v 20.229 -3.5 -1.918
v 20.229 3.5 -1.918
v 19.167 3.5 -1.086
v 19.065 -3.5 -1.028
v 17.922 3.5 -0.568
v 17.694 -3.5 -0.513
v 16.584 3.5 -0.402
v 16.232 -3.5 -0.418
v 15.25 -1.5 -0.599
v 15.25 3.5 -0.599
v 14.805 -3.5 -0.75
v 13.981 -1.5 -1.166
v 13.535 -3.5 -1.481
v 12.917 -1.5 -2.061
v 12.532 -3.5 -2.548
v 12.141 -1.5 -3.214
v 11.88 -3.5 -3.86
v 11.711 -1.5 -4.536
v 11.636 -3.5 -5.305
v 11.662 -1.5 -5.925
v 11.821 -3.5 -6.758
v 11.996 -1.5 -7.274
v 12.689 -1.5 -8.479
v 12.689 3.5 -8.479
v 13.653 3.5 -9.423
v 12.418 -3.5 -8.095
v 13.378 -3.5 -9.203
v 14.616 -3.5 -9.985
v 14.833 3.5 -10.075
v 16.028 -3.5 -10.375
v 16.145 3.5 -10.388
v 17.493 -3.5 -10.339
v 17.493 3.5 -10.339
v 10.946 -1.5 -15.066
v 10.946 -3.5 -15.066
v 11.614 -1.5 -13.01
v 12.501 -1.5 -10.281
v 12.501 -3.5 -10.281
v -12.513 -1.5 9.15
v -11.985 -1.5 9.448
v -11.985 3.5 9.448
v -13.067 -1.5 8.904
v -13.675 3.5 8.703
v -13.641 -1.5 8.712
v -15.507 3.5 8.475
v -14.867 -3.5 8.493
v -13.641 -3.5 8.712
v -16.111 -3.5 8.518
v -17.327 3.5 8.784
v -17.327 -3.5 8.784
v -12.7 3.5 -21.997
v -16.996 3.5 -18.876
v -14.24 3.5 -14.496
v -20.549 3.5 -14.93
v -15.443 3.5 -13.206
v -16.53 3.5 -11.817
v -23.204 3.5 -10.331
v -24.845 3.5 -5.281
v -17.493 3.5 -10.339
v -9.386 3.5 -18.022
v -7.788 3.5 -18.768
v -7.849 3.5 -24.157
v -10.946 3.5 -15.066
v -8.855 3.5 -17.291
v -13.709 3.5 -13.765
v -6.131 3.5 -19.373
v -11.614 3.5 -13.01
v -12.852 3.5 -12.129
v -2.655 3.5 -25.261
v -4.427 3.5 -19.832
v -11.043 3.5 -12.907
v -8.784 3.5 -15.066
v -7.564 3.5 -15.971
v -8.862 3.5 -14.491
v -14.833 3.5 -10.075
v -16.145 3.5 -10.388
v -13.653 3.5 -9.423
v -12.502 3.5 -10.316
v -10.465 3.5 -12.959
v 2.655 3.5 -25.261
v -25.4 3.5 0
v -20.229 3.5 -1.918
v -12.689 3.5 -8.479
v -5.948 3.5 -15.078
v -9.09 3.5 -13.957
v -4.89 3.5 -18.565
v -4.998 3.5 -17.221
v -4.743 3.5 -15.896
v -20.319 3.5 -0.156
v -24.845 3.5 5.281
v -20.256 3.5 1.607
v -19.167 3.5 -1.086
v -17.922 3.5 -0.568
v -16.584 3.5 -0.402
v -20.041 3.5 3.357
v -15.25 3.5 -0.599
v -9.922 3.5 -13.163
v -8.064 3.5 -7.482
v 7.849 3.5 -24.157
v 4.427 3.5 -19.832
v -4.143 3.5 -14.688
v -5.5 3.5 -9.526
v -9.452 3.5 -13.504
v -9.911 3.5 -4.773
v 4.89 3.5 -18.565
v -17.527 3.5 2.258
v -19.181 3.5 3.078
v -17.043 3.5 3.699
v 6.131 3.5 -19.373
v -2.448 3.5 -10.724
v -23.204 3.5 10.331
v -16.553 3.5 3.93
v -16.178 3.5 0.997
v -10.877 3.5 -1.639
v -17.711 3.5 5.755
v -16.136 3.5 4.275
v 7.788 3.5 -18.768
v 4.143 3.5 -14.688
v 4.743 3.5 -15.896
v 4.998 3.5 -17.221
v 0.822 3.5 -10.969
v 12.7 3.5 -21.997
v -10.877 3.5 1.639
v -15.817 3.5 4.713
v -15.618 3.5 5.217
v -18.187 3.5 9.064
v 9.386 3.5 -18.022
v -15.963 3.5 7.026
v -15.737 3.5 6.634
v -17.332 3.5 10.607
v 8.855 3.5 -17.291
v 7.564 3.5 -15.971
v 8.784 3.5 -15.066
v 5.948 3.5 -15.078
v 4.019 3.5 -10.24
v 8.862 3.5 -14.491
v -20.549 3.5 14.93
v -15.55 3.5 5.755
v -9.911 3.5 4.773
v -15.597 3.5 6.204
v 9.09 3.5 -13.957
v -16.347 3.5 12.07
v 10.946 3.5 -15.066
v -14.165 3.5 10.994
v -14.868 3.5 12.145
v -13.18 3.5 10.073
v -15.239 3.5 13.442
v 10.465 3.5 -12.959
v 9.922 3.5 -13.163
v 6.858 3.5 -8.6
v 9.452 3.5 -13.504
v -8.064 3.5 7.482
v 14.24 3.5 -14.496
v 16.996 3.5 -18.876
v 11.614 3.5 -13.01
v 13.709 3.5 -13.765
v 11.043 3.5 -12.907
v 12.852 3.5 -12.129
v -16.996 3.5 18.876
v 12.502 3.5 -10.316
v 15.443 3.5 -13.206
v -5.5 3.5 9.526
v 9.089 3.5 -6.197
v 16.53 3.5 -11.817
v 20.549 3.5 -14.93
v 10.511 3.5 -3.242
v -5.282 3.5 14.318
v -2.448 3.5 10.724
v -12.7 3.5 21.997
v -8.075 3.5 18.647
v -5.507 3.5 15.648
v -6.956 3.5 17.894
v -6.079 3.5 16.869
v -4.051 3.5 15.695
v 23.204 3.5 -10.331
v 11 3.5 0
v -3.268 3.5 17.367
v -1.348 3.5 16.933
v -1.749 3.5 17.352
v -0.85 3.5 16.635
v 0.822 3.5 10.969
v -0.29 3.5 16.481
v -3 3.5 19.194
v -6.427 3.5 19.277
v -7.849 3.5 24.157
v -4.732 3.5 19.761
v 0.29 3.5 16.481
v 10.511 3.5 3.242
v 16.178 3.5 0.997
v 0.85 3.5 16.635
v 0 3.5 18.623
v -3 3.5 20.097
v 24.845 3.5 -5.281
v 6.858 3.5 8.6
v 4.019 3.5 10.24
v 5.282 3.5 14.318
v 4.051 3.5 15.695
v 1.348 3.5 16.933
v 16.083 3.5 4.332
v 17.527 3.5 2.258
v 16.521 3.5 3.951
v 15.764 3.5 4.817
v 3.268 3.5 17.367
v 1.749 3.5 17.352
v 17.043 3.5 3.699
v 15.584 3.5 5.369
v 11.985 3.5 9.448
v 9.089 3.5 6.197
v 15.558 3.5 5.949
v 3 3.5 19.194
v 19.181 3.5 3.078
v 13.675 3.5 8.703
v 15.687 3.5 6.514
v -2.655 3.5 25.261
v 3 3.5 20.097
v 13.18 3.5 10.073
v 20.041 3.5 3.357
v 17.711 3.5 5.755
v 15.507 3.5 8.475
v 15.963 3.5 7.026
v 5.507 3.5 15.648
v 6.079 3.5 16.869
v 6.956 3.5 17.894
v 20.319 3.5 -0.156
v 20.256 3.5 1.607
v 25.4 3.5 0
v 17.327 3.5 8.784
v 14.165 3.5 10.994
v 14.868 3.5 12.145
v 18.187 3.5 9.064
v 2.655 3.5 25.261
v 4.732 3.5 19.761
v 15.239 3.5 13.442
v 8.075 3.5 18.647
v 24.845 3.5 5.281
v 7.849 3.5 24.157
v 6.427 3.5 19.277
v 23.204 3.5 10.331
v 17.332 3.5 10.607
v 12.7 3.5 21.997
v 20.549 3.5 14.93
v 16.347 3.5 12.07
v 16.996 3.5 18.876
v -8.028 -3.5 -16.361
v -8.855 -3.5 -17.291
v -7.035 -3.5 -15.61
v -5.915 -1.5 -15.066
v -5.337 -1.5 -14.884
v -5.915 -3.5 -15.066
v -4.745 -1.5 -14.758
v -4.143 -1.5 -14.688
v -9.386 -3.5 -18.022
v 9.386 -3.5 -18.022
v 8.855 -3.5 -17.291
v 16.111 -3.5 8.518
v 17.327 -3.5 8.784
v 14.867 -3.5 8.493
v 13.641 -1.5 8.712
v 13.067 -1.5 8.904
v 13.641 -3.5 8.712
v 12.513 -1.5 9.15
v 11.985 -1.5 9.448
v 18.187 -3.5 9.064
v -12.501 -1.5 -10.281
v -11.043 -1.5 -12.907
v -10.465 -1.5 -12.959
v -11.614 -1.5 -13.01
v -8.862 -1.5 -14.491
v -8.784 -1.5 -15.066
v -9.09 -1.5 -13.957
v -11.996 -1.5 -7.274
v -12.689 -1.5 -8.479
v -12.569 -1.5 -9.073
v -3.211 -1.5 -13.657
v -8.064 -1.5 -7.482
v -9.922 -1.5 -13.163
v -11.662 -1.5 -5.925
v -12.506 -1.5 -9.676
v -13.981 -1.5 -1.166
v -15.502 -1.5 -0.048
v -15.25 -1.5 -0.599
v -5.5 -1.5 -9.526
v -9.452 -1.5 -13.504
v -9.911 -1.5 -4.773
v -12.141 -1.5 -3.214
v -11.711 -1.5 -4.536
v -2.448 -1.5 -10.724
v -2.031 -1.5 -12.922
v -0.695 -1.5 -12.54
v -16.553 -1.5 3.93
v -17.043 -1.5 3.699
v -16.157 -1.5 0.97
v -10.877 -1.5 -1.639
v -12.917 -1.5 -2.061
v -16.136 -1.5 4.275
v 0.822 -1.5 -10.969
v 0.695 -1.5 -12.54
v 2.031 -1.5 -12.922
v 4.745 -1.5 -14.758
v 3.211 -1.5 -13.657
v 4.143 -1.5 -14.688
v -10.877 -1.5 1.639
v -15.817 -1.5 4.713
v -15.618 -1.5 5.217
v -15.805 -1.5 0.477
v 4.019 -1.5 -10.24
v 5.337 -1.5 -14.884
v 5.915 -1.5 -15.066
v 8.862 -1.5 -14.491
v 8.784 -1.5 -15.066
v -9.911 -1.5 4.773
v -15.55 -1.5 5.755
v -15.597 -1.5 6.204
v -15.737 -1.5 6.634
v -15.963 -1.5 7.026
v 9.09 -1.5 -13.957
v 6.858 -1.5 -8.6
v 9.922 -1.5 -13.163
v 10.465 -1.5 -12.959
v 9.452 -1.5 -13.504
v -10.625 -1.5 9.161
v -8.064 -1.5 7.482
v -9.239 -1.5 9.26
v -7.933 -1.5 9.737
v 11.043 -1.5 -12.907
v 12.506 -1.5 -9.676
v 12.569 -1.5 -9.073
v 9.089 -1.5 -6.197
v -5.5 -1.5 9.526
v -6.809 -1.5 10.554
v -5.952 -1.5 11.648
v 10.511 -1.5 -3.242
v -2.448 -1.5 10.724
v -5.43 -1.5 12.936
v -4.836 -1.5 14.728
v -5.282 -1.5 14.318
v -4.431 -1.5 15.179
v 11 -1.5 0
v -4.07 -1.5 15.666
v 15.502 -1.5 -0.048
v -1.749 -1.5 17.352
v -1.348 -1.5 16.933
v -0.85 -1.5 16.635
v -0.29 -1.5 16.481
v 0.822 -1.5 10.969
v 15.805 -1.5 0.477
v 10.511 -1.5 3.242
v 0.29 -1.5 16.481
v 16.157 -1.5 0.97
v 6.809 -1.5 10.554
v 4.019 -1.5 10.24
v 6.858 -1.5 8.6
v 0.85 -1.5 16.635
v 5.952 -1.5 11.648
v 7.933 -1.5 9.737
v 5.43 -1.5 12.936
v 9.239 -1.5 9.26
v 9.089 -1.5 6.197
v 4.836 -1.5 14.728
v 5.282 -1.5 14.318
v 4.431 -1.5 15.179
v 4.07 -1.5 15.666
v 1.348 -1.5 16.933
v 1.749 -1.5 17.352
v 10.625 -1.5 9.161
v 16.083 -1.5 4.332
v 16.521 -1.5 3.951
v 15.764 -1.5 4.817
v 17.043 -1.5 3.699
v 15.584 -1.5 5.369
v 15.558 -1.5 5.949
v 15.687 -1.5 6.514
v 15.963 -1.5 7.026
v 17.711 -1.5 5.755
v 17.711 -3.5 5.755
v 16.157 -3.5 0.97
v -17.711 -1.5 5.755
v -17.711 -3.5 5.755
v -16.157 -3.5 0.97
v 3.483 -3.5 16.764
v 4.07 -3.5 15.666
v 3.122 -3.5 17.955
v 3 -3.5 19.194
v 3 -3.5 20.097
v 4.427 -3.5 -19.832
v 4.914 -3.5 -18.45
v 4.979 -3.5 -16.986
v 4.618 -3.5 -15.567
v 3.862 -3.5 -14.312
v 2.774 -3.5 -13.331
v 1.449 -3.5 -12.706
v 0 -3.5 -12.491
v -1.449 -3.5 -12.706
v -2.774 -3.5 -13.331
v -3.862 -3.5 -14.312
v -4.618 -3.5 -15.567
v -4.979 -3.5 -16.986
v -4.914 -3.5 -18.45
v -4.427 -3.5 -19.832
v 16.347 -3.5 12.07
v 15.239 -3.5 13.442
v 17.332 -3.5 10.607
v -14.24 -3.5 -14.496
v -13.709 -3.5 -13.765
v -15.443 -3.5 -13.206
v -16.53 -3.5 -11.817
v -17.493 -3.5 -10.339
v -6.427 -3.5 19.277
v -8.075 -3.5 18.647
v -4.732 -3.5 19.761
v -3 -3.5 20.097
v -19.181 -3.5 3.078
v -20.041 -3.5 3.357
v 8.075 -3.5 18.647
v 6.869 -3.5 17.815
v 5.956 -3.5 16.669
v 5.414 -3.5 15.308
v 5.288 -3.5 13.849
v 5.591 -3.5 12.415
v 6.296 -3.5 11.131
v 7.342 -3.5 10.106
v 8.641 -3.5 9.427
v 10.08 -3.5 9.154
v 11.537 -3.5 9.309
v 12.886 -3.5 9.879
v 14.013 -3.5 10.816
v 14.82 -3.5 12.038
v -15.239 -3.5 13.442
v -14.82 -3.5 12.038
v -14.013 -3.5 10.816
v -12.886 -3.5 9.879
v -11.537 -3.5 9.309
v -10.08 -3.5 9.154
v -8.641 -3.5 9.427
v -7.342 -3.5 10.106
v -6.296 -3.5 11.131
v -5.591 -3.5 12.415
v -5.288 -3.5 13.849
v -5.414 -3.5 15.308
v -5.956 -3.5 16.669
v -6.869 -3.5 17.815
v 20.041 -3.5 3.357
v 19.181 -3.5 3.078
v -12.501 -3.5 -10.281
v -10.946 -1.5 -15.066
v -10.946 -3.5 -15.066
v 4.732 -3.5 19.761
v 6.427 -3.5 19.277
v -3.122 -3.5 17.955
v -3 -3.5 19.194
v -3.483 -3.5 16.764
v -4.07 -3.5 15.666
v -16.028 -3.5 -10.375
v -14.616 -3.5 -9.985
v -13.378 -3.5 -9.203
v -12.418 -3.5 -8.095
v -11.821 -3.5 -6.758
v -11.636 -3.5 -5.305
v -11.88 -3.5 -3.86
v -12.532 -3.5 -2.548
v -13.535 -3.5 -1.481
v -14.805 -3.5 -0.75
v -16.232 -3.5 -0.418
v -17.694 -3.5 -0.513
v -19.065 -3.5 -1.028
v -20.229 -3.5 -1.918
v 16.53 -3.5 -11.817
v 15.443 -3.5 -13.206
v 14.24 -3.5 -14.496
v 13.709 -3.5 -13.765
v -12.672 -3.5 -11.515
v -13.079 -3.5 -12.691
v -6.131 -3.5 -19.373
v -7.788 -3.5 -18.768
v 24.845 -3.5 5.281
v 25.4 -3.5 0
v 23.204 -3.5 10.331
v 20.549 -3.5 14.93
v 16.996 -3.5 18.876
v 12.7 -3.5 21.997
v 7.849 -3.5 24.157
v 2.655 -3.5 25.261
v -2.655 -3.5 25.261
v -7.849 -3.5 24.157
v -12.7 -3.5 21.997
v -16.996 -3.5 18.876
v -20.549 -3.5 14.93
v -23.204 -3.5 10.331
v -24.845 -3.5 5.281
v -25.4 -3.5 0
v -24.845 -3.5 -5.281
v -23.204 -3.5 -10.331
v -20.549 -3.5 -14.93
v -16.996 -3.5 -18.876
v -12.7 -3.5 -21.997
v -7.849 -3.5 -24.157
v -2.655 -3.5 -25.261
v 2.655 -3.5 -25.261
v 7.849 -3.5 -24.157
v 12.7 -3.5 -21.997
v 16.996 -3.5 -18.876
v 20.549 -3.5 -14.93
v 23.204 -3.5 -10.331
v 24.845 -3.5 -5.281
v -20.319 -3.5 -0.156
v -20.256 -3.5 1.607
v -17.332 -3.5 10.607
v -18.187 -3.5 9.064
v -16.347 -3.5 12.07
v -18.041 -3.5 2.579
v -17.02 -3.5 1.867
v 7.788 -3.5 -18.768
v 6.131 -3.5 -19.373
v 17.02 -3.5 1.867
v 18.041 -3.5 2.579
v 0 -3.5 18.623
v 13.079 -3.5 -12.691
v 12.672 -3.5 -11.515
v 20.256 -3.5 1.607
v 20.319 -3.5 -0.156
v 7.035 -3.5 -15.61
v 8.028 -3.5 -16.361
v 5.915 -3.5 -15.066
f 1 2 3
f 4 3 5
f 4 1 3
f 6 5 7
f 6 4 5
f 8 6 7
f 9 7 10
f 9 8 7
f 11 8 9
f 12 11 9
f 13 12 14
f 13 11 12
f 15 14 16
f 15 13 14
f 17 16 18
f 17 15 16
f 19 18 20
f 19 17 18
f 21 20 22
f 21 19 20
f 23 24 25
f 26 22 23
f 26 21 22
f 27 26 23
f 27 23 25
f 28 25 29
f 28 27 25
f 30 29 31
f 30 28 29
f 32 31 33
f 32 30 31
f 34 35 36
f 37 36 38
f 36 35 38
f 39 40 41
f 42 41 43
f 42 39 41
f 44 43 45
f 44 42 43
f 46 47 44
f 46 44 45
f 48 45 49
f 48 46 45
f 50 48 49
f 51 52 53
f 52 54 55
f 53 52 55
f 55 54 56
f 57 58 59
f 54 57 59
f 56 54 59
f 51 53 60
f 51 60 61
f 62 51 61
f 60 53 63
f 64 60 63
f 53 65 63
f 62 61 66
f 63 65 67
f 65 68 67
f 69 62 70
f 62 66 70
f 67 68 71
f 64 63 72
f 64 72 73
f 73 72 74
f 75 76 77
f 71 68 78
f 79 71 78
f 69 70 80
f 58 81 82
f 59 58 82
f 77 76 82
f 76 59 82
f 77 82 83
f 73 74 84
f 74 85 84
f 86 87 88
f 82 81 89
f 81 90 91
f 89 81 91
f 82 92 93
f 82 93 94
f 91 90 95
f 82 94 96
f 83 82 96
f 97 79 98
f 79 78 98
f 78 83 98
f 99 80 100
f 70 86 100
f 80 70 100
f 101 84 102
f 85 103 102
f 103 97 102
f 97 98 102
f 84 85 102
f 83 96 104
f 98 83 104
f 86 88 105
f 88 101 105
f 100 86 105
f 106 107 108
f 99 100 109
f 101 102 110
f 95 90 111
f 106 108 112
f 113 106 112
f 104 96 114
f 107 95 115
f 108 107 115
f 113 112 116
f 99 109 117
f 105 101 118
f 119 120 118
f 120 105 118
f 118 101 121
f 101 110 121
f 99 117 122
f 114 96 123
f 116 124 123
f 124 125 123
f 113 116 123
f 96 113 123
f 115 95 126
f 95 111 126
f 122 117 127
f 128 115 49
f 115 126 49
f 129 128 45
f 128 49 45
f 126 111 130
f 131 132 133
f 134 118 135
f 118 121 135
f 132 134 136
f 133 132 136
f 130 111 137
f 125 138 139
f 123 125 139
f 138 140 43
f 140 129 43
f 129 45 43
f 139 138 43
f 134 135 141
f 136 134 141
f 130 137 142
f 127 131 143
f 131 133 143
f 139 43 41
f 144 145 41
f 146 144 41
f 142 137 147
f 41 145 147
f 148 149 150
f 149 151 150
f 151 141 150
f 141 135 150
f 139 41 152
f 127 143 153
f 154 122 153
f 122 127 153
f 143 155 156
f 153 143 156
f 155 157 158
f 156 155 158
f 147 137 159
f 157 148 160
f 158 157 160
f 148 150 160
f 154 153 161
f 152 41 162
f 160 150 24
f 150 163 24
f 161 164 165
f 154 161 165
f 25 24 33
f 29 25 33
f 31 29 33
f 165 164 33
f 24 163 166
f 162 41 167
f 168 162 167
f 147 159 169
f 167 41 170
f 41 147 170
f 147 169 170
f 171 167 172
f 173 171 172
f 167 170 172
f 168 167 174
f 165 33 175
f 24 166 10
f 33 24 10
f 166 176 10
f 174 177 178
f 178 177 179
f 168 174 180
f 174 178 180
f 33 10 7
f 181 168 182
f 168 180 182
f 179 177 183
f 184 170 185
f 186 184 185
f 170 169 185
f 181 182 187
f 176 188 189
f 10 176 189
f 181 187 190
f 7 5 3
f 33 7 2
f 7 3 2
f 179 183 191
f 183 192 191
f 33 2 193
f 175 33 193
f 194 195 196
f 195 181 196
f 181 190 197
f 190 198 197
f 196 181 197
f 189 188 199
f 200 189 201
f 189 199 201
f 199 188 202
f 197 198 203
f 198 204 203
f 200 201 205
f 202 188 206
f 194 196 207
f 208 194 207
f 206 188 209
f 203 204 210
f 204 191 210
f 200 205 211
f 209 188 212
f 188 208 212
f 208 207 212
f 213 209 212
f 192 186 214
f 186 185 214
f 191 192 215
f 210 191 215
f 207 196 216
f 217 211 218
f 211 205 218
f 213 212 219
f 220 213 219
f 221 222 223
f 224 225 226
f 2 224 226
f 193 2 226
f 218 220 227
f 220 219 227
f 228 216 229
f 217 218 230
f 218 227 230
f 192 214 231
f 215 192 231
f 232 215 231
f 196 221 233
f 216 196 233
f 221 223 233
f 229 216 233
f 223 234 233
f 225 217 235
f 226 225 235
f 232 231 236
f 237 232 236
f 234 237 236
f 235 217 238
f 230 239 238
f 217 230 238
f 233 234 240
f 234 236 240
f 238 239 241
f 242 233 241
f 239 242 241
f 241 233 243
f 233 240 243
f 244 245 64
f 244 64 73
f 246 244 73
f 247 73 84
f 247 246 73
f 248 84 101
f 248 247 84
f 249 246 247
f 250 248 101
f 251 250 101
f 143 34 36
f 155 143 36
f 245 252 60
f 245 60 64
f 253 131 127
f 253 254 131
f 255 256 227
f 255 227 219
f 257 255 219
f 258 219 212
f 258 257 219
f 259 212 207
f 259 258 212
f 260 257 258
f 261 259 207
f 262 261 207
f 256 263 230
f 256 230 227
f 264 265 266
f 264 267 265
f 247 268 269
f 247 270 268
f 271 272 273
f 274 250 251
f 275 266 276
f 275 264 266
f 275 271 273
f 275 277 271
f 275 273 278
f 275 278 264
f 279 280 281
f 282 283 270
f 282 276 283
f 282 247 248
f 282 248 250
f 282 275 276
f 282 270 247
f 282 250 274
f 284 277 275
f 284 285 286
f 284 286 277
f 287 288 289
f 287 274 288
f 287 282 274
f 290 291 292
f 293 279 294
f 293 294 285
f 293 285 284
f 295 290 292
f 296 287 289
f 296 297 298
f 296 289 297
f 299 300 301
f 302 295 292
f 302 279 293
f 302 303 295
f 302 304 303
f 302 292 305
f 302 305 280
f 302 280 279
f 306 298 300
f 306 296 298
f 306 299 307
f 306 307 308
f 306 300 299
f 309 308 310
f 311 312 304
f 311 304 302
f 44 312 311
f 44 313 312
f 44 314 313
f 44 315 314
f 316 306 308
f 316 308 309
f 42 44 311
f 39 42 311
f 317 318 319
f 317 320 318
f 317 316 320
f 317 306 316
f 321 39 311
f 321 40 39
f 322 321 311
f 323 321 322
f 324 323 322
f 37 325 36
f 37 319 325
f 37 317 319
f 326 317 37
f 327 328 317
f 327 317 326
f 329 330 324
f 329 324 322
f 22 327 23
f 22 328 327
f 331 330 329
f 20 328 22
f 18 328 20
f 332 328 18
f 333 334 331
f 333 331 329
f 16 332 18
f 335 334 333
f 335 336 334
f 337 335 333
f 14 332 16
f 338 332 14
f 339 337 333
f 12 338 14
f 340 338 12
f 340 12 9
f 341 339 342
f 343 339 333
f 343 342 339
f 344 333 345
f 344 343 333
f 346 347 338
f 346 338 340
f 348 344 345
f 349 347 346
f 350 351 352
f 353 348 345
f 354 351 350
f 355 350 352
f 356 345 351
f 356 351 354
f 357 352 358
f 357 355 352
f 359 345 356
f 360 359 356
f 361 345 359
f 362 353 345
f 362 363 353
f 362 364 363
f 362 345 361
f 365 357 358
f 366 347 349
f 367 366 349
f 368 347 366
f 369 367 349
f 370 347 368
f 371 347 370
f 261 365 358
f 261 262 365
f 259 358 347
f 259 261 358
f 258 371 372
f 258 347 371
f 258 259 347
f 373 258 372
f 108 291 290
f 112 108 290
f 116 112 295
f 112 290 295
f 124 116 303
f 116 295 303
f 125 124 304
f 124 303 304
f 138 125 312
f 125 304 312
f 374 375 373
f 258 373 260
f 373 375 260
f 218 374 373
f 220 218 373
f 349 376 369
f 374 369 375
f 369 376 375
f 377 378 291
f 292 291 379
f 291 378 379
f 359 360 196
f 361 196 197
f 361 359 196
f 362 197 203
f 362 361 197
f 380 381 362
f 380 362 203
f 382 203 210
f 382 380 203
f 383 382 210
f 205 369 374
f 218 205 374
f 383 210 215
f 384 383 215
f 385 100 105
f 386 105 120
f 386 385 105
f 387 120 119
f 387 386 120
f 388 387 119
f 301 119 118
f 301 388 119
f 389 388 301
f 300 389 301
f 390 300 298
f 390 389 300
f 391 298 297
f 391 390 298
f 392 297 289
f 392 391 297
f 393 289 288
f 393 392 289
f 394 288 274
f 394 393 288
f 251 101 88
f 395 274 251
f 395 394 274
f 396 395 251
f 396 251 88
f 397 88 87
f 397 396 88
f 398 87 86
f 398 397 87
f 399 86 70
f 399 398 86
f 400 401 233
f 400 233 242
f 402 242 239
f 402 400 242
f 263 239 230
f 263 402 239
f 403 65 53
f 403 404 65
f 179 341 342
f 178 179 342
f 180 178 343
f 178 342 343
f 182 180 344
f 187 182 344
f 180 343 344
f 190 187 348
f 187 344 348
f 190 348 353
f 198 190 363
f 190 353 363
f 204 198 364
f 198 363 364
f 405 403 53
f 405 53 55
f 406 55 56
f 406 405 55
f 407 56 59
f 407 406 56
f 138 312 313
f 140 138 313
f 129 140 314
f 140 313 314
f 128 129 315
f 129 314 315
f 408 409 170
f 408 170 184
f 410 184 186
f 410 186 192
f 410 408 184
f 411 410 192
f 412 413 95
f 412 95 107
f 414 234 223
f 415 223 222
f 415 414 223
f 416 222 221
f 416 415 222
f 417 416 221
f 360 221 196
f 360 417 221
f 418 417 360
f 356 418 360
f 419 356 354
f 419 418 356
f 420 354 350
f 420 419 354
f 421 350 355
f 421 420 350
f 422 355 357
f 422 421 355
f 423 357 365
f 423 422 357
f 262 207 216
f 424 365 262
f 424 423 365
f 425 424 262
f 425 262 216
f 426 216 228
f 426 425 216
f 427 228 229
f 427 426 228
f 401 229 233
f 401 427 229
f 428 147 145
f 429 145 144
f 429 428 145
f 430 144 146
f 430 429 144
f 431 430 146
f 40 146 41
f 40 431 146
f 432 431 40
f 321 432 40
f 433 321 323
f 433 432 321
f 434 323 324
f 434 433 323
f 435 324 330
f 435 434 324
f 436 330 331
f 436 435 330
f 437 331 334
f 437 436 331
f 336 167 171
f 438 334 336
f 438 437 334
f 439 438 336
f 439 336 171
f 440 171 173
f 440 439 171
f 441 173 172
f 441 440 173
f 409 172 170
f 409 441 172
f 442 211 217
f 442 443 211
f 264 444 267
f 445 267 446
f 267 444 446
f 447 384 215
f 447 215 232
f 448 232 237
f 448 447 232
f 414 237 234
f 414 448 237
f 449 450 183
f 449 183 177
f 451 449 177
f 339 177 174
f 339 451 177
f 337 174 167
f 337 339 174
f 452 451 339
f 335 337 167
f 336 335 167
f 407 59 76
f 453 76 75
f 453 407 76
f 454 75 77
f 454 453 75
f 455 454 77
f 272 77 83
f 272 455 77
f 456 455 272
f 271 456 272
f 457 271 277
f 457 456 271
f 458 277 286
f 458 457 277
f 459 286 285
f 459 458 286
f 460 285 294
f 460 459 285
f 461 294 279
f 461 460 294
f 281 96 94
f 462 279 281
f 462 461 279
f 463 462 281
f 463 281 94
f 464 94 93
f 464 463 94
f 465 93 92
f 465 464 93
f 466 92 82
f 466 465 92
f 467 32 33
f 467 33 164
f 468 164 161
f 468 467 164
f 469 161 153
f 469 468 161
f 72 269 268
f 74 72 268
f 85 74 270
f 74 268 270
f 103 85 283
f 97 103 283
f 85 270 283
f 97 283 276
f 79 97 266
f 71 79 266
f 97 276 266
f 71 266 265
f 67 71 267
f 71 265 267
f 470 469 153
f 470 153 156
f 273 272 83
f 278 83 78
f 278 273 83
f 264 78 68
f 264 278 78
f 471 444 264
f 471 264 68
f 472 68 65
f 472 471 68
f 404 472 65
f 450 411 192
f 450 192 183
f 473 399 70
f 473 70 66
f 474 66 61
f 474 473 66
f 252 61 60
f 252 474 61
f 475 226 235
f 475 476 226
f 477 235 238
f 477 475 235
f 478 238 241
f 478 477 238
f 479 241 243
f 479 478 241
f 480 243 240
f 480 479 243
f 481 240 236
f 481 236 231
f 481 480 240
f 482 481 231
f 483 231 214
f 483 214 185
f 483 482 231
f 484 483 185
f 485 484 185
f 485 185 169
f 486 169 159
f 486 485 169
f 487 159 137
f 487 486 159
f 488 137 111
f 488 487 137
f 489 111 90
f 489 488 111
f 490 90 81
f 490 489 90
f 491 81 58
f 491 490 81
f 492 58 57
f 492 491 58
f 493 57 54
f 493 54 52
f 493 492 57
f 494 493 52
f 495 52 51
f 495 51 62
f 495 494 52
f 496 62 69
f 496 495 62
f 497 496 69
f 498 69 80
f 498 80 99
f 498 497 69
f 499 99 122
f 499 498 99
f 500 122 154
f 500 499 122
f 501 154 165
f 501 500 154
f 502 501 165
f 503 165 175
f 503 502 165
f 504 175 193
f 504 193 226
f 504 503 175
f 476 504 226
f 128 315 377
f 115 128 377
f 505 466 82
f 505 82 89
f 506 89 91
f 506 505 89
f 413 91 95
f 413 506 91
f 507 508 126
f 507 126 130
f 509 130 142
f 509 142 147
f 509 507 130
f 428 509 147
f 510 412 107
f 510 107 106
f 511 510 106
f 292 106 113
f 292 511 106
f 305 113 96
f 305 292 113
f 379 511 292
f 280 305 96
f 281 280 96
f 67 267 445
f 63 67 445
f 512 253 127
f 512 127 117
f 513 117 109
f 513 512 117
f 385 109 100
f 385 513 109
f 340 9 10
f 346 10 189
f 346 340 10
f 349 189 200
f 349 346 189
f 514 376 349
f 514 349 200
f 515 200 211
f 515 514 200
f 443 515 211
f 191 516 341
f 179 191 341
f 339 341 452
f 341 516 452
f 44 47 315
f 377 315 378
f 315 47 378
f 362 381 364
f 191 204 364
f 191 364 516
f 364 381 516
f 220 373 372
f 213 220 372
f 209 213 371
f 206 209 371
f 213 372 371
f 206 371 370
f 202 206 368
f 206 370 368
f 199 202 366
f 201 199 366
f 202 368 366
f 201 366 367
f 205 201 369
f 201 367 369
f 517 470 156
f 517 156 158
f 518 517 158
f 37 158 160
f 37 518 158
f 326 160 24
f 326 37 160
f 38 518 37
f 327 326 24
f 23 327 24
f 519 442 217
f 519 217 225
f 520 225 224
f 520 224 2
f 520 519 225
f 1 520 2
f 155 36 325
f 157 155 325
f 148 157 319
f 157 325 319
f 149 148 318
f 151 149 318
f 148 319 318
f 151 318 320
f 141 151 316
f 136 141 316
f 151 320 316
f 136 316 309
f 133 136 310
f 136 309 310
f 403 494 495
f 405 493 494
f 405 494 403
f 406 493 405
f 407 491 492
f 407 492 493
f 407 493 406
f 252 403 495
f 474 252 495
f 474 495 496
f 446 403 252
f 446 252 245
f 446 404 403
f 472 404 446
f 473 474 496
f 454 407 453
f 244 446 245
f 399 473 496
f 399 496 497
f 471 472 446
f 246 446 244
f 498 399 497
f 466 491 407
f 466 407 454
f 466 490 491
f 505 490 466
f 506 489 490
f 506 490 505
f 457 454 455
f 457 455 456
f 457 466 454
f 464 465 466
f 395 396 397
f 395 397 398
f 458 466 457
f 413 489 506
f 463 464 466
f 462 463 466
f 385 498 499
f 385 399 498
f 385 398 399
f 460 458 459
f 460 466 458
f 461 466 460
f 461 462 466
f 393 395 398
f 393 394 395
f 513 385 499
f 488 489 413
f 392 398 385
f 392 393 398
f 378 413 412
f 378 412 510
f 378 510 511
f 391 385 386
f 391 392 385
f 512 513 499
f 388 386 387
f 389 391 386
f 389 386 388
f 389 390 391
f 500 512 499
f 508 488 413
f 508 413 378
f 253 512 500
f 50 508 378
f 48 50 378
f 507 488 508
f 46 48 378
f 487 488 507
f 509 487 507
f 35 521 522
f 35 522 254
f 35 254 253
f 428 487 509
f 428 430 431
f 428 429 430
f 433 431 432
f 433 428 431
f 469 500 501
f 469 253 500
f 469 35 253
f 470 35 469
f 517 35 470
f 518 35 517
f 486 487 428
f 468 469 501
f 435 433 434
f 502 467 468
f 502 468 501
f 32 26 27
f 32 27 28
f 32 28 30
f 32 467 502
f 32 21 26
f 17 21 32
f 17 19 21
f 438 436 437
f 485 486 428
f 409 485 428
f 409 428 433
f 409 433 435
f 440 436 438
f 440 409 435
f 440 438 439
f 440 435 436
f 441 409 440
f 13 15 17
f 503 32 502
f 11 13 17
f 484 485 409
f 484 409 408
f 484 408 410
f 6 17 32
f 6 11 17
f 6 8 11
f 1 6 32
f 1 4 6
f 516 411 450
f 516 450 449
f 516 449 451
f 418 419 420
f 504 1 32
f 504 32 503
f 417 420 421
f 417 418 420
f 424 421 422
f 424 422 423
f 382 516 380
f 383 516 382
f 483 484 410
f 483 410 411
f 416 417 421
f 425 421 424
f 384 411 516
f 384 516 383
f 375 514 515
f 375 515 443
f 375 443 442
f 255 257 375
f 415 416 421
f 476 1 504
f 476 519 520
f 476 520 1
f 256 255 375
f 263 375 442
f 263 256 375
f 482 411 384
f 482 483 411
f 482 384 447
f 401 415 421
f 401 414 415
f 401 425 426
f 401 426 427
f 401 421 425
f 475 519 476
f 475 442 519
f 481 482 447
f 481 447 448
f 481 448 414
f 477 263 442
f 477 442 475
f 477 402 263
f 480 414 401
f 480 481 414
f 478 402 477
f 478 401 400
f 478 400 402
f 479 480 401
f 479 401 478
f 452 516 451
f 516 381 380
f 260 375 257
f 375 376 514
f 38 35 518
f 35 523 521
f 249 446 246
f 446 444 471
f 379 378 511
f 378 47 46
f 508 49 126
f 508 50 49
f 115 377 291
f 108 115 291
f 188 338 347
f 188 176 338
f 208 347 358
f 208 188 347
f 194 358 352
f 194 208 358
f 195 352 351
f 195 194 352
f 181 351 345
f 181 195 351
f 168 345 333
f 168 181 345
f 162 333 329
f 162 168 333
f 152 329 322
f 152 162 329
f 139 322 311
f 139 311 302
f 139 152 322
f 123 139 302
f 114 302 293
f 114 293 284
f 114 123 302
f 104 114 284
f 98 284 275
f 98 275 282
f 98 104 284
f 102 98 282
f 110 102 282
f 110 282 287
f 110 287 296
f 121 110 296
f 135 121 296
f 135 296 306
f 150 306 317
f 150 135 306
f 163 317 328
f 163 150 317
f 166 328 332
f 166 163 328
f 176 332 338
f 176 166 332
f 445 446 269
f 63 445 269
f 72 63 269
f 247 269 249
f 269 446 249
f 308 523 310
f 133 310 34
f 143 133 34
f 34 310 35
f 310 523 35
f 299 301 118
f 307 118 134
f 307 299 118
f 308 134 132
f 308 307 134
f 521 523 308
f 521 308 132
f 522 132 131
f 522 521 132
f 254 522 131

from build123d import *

# Parameters (mm, degrees)
F0_R     = 25.4
F0_R_2   = 11
F1_DEPTH = 3.5
F2_R     = 11
F3_DEPTH = 2
F5_DEPTH = 25.4
F6_R     = 5.0054287193
F7_DEPTH = 7


with BuildPart() as f1:
    # F0 (on Front) → F1 (new body, symmetric)
    with BuildSketch(Plane.XZ):
        Circle(F0_R)
        with BuildLine():
            ThreePointArc((9.3858592072, -18.022431771), (0, -20.32), (-9.3858592072, -18.022431771))
            Line((-9.3858592072, -18.022431771), (-8.8547516049, -17.2914248694))
            ThreePointArc((-8.8547516049, -17.2914248694), (-6.0948306116, -15.1356722669), (-2.6118222651, -14.7708626849))
            ThreePointArc((-2.6118222651, -14.7708626849), (0, -15), (2.6118222651, -14.7708626849))
            ThreePointArc((2.6118222651, -14.7708626849), (6.0948306116, -15.1356722669), (8.8547516049, -17.2914248694))
            Line((8.8547516049, -17.2914248694), (9.3858592072, -18.022431771))
        make_face(mode=Mode.SUBTRACT)
        with BuildLine():
            ThreePointArc((-14.2399611735, -14.4957202573), (-19.3254684111, -6.2792253257), (-20.0407411772, 3.3572448629))
            Line((-20.0407411772, 3.3572448629), (-19.181391025, 3.0780250724))
            ThreePointArc((-19.181391025, 3.0780250724), (-16.2782859748, 1.1193484171), (-14.855022674, -2.0804570066))
            ThreePointArc((-14.855022674, -2.0804570066), (-14.2658477444, -4.6352549156), (-13.2408277416, -7.0484381758))
            ThreePointArc((-13.2408277416, -7.0484381758), (-12.5114735012, -10.4737083206), (-13.7088535712, -13.7647133557))
            Line((-13.7088535712, -13.7647133557), (-14.2399611735, -14.4957202573))
        make_face(mode=Mode.SUBTRACT)
        Circle(F0_R_2, mode=Mode.SUBTRACT)
        with BuildLine():
            ThreePointArc((20.0407411772, 3.3572448629), (19.3254684111, -6.2792253257), (14.2399611735, -14.4957202573))
            Line((14.2399611735, -14.4957202573), (13.7088535712, -13.7647133557))
            ThreePointArc((13.7088535712, -13.7647133557), (12.5114735012, -10.4737083206), (13.2408277416, -7.0484381758))
            ThreePointArc((13.2408277416, -7.0484381758), (14.2658477444, -4.6352549156), (14.855022674, -2.0804570066))
            ThreePointArc((14.855022674, -2.0804570066), (16.2782859748, 1.1193484171), (19.181391025, 3.0780250724))
            Line((19.181391025, 3.0780250724), (20.0407411772, 3.3572448629))
        make_face(mode=Mode.SUBTRACT)
        with BuildLine():
            ThreePointArc((-18.1866392109, 9.0635839606), (-11.9437963266, 16.4392253257), (-3, 20.0973232048))
            Line((-3, 20.0973232048), (-3, 19.1937489824))
            ThreePointArc((-3, 19.1937489824), (-3.9657033994, 15.8274676339), (-6.5690866511, 13.4850695427))
            ThreePointArc((-6.5690866511, 13.4850695427), (-8.8167787844, 12.1352549156), (-10.7951038486, 10.4146883246))
            ThreePointArc((-10.7951038486, 10.4146883246), (-13.8273464846, 8.6625645365), (-17.3272890587, 8.7843641702))
            Line((-17.3272890587, 8.7843641702), (-18.1866392109, 9.0635839606))
        make_face(mode=Mode.SUBTRACT)
        with BuildLine():
            Line((3, 19.1937489824), (3, 20.0973232048))
            ThreePointArc((3, 20.0973232048), (11.9437963266, 16.4392253257), (18.1866392109, 9.0635839606))
            Line((18.1866392109, 9.0635839606), (17.3272890587, 8.7843641702))
            ThreePointArc((17.3272890587, 8.7843641702), (13.8273464846, 8.6625645365), (10.7951038486, 10.4146883246))
            ThreePointArc((10.7951038486, 10.4146883246), (8.8167787844, 12.1352549156), (6.5690866511, 13.4850695427))
            ThreePointArc((6.5690866511, 13.4850695427), (3.9657033994, 15.8274676339), (3, 19.1937489824))
        make_face(mode=Mode.SUBTRACT)
    extrude(amount=F1_DEPTH, both=True)

    # F2 (on face) → F3 (cut)
    with BuildSketch(Plane.XZ.offset(3.5)):
        with BuildLine():
            Line((5.9151542337, -15.0662788144), (10.9462922974, -15.0662788144))
            Line((10.9462922974, -15.0662788144), (12.5009994602, -10.2813821745))
            ThreePointArc((12.5009994602, -10.2813821745), (12.6561218663, -8.6157571432), (13.2408277416, -7.0484381758))
            ThreePointArc((13.2408277416, -7.0484381758), (14.2658477444, -4.6352549156), (14.855022674, -2.0804570066))
            ThreePointArc((14.855022674, -2.0804570066), (15.3032326588, -0.468787836), (16.1567658253, 0.9699097832))
            Line((16.1567658253, 0.9699097832), (17.711472988, 5.7548064231))
            Line((17.711472988, 5.7548064231), (13.6411967935, 8.7120351792))
            ThreePointArc((13.6411967935, 8.7120351792), (12.1050287134, 9.3742717954), (10.7951038486, 10.4146883246))
            ThreePointArc((10.7951038486, 10.4146883246), (8.8167787844, 12.1352549156), (6.5690866511, 13.4850695427))
            ThreePointArc((6.5690866511, 13.4850695427), (5.1748026867, 14.4093757325), (4.0702761946, 15.6657160264))
            Line((4.0702761946, 15.6657160264), (0, 18.6229447825))
            Line((0, 18.6229447825), (-4.0702761946, 15.6657160264))
            ThreePointArc((-4.0702761946, 15.6657160264), (-5.1748026867, 14.4093757325), (-6.5690866511, 13.4850695427))
            ThreePointArc((-6.5690866511, 13.4850695427), (-8.8167787844, 12.1352549156), (-10.7951038486, 10.4146883246))
            ThreePointArc((-10.7951038486, 10.4146883246), (-12.1050287134, 9.3742717954), (-13.6411967935, 8.7120351792))
            Line((-13.6411967935, 8.7120351792), (-17.711472988, 5.7548064231))
            Line((-17.711472988, 5.7548064231), (-16.1567658253, 0.9699097832))
            ThreePointArc((-16.1567658253, 0.9699097832), (-15.3032326588, -0.468787836), (-14.855022674, -2.0804570066))
            ThreePointArc((-14.855022674, -2.0804570066), (-14.2658477444, -4.6352549156), (-13.2408277416, -7.0484381758))
            ThreePointArc((-13.2408277416, -7.0484381758), (-12.6561218663, -8.6157571432), (-12.5009994602, -10.2813821745))
            Line((-12.5009994602, -10.2813821745), (-10.9462922974, -15.0662788144))
            Line((-10.9462922974, -15.0662788144), (-5.9151542337, -15.0662788144))
            ThreePointArc((-5.9151542337, -15.0662788144), (-4.2831152343, -14.6991025487), (-2.6118222651, -14.7708626849))
            ThreePointArc((-2.6118222651, -14.7708626849), (0, -15), (2.6118222651, -14.7708626849))
            ThreePointArc((2.6118222651, -14.7708626849), (4.2831152343, -14.6991025487), (5.9151542337, -15.0662788144))
        make_face()
        Circle(F2_R, mode=Mode.SUBTRACT)
    extrude(amount=-F3_DEPTH, mode=Mode.SUBTRACT)

    # F4 (on face) → F5 (cut)
    with BuildSketch(Plane.XZ.offset(1.5)):
        with BuildLine():
            ThreePointArc((-15.5496324927, 5.7548064231), (-15.6554404977, 6.4228518753), (-15.9625072881, 7.0255043841))
            Line((-15.9625072881, 7.0255043841), (-17.711472988, 5.7548064231))
            Line((-17.711472988, 5.7548064231), (-17.0434275358, 3.6987739328))
            ThreePointArc((-17.0434275358, 3.6987739328), (-15.9625072881, 4.4841084621), (-15.5496324927, 5.7548064231))
        make_face()
        with BuildLine():
            ThreePointArc((-8.7844518021, -15.0662788144), (-9.6755943364, -13.3173131145), (-11.6143377496, -13.0102463241))
            Line((-11.6143377496, -13.0102463241), (-10.9462922974, -15.0662788144))
            Line((-10.9462922974, -15.0662788144), (-8.7844518021, -15.0662788144))
        make_face()
        with BuildLine():
            Line((10.9462922974, -15.0662788144), (11.6143377496, -13.0102463241))
            ThreePointArc((11.6143377496, -13.0102463241), (9.6755943364, -13.3173131145), (8.7844518021, -15.0662788144))
            Line((8.7844518021, -15.0662788144), (10.9462922974, -15.0662788144))
        make_face()
        with BuildLine():
            Line((17.711472988, 5.7548064231), (15.9625072881, 7.0255043841))
            ThreePointArc((15.9625072881, 7.0255043841), (15.6554404977, 5.0867609709), (17.0434275358, 3.6987739328))
            Line((17.0434275358, 3.6987739328), (17.711472988, 5.7548064231))
        make_face()
        with BuildLine():
            Line((0, 18.6229447825), (-1.7489656999, 17.3522468215))
            ThreePointArc((-1.7489656999, 17.3522468215), (0, 16.4611042872), (1.7489656999, 17.3522468215))
            Line((1.7489656999, 17.3522468215), (0, 18.6229447825))
        make_face()
    extrude(amount=-F5_DEPTH, mode=Mode.SUBTRACT)

    # F6 (on face) → F7 (join)
    with BuildSketch(Plane.XZ.offset(3.5)):
        with Locations((-10.2844180941, 14.1552871273)):
            Circle(F6_R)
        with Locations((-16.6405380308, -5.4068385621)):
            Circle(F6_R)
        with Locations((0, -17.4968971303)):
            Circle(F6_R)
        with Locations((16.6405380308, -5.4068385621)):
            Circle(F6_R)
        with Locations((10.2844180941, 14.1552871273)):
            Circle(F6_R)
    extrude(amount=-F7_DEPTH)


solid = f1.part
